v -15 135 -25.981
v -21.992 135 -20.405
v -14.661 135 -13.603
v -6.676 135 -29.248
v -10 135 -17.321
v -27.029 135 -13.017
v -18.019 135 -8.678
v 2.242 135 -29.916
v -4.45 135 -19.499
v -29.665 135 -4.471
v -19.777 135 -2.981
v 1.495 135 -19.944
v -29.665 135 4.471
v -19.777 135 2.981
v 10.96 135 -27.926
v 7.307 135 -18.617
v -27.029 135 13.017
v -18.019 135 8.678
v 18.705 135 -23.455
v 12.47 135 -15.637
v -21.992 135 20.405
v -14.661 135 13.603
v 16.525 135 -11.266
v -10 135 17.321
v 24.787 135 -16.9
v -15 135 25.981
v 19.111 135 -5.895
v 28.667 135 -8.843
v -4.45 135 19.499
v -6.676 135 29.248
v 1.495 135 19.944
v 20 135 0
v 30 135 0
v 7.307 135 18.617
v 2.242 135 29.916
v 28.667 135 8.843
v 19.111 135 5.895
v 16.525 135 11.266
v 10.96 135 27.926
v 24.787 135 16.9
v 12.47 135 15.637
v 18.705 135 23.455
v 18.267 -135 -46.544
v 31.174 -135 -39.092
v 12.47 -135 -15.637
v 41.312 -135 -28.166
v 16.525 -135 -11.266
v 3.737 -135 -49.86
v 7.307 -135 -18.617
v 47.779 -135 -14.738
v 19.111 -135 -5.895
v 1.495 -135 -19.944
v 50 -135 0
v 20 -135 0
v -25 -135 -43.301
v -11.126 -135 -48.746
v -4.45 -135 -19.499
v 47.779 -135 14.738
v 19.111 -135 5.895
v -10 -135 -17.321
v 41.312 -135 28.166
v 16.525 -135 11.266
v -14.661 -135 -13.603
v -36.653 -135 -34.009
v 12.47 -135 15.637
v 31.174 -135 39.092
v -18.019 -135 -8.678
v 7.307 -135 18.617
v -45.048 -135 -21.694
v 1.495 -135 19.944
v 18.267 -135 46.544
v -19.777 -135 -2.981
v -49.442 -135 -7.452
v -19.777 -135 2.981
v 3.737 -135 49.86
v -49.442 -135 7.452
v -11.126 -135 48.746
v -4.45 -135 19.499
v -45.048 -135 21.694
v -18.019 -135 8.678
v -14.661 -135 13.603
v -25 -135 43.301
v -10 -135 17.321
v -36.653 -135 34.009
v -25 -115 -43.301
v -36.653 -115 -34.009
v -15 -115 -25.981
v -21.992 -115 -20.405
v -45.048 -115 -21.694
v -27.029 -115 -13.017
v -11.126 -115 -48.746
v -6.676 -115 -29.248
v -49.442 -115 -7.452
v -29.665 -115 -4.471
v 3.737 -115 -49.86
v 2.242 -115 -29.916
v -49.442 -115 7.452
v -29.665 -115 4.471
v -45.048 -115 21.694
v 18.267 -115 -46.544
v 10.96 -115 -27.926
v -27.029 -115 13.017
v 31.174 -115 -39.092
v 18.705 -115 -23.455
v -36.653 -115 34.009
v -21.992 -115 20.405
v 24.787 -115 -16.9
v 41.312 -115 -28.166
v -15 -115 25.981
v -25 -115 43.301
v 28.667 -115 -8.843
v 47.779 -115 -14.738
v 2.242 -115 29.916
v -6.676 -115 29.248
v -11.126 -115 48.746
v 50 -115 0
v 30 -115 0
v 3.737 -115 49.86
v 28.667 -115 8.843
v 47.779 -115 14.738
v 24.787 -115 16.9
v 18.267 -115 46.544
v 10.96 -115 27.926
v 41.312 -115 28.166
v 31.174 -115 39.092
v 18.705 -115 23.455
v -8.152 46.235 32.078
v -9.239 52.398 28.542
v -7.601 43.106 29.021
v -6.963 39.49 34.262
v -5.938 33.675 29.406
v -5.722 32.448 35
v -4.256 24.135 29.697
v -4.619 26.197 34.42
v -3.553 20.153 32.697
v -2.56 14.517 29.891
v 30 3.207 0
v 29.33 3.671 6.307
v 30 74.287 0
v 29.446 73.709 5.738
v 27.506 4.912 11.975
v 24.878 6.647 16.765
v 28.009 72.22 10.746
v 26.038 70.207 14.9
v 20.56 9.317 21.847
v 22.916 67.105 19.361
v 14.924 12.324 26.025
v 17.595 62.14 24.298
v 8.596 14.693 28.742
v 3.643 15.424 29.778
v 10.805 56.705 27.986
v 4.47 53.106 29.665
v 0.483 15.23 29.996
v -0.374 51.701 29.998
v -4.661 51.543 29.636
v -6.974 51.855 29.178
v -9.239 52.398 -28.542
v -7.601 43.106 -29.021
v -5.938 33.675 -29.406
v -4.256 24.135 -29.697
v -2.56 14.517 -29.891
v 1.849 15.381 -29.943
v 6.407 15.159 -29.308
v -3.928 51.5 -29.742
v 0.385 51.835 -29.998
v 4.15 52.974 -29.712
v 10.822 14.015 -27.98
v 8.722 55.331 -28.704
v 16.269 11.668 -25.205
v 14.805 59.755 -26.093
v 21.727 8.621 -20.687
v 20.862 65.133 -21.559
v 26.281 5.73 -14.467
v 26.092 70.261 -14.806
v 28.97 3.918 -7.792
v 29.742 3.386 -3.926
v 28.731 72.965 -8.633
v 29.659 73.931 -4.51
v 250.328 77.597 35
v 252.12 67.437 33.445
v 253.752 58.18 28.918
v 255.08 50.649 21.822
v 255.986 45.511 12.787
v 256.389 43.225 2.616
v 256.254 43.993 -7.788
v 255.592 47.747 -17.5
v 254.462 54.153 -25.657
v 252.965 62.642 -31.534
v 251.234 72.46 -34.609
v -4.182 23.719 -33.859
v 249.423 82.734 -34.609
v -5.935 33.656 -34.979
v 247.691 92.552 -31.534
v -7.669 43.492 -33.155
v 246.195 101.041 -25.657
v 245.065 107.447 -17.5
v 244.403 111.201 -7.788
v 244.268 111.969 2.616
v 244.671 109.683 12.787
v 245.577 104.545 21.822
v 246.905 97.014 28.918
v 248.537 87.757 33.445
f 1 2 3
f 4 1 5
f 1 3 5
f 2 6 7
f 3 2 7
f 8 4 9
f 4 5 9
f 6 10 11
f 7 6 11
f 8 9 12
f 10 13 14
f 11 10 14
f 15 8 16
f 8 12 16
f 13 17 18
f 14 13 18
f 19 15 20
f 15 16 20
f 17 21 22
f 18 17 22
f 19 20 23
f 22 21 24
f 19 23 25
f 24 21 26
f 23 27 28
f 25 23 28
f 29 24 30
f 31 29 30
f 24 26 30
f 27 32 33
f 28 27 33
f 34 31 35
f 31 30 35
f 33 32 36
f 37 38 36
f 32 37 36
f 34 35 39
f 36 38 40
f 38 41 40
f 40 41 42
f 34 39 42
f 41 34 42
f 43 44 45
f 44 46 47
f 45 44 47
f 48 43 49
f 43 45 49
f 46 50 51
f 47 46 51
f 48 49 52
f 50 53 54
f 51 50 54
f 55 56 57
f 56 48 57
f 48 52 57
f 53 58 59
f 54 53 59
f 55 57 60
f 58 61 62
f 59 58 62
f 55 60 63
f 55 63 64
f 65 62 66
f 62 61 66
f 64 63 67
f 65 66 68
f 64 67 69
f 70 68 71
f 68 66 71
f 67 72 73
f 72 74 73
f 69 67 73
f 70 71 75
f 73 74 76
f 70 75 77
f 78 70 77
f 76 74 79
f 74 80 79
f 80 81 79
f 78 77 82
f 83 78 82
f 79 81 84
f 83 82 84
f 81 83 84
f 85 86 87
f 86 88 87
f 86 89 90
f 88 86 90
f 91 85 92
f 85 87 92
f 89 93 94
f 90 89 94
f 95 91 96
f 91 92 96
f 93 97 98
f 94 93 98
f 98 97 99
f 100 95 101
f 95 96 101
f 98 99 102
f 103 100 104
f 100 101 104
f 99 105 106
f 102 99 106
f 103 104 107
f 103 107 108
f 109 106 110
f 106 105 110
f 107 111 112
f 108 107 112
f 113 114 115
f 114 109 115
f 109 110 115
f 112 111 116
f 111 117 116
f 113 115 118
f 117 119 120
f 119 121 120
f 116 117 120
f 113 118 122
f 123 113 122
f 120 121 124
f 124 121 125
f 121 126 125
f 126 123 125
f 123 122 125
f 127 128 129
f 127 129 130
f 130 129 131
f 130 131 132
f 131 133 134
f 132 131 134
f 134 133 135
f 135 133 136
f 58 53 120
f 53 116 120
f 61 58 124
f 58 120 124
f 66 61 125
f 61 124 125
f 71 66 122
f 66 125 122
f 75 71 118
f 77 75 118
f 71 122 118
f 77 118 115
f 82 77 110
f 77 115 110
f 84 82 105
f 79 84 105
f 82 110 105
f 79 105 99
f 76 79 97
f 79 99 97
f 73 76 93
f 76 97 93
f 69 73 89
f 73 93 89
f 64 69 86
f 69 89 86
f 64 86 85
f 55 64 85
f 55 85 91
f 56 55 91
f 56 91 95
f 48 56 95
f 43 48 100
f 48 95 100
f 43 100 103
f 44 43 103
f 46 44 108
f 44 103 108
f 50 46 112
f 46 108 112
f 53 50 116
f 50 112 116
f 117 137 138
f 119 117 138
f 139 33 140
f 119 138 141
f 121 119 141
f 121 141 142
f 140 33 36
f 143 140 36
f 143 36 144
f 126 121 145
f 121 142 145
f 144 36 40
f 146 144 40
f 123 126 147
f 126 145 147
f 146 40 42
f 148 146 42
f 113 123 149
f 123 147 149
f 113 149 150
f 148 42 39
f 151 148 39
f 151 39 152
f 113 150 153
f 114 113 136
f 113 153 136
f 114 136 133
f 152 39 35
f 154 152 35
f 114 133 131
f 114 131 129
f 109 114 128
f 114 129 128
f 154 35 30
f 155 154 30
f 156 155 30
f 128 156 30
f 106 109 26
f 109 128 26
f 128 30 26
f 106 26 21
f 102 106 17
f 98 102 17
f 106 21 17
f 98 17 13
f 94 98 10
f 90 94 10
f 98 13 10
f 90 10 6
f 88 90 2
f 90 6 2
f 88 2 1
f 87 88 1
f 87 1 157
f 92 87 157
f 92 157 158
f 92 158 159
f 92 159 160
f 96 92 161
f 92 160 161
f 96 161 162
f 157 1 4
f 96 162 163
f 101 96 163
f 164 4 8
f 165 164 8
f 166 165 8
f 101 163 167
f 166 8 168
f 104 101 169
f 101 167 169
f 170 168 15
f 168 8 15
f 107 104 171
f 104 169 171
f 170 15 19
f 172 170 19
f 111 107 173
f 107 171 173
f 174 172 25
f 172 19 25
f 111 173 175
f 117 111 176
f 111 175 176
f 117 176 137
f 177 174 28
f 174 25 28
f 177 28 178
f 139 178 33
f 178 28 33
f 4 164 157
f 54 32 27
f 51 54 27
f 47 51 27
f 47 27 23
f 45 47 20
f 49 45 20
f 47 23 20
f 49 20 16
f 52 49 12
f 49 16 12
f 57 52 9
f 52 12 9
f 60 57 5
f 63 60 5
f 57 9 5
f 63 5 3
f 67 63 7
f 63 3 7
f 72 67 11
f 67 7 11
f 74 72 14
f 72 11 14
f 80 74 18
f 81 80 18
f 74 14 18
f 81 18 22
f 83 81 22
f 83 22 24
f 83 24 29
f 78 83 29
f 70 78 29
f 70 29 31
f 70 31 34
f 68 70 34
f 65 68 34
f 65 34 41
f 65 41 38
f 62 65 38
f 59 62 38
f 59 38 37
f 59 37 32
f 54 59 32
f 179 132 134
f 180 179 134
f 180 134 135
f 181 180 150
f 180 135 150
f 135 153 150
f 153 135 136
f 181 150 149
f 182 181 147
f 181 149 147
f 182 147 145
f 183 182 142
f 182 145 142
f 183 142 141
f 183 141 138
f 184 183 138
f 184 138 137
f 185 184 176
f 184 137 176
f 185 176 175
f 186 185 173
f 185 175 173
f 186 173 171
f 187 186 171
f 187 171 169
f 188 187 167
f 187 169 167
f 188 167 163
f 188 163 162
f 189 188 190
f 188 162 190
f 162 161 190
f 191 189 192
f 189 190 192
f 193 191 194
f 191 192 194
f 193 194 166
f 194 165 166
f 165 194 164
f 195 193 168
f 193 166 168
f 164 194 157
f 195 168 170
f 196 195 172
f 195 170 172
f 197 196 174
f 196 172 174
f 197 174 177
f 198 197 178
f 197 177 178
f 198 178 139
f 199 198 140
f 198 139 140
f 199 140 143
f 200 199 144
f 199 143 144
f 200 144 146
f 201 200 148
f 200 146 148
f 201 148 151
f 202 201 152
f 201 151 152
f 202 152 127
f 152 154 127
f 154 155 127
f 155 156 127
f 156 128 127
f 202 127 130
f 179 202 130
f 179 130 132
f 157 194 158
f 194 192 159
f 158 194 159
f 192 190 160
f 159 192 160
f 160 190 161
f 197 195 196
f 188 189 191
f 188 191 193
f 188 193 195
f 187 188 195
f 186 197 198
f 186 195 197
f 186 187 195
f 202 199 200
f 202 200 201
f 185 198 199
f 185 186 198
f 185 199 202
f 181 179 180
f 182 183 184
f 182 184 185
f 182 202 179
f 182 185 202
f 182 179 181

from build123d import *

# Parameters (mm, degrees)
SKETCH3_R           = 35
BOSS_EXTRUDE1_DEPTH = 260
SKETCH4_R           = 20
CUT_EXTRUDE1_DEPTH  = 376.691521045


with BuildPart() as part:
    # Sketch1 → Revolve2 (revolve)
    with BuildSketch(Plane.XY):
        Polygon((0, 135), (0, -135), (50, -135), (50, -115), (30, -115), (30, 135), align=None)
    revolve(axis=Axis((0, 135, 0), (0, -1, 0)))

    # Sketch3 → Boss-Extrude1 (add)
    with BuildSketch(Plane(origin=(0, 0, 0), x_dir=(0, 0, 1), z_dir=(0.9848077530122081, 0.17364817766693041, 0))):
        with Locations((0, -32.949046657)):
            Circle(SKETCH3_R)
    extrude(amount=BOSS_EXTRUDE1_DEPTH)

    # Sketch4 → Cut-Extrude1 (cut, through all)
    with BuildSketch(Plane(origin=(0, 135, 0), x_dir=(1, 0, 0), z_dir=(0, 1, 0))):
        Circle(SKETCH4_R)
    extrude(amount=-CUT_EXTRUDE1_DEPTH, mode=Mode.SUBTRACT)


solid = part.part
